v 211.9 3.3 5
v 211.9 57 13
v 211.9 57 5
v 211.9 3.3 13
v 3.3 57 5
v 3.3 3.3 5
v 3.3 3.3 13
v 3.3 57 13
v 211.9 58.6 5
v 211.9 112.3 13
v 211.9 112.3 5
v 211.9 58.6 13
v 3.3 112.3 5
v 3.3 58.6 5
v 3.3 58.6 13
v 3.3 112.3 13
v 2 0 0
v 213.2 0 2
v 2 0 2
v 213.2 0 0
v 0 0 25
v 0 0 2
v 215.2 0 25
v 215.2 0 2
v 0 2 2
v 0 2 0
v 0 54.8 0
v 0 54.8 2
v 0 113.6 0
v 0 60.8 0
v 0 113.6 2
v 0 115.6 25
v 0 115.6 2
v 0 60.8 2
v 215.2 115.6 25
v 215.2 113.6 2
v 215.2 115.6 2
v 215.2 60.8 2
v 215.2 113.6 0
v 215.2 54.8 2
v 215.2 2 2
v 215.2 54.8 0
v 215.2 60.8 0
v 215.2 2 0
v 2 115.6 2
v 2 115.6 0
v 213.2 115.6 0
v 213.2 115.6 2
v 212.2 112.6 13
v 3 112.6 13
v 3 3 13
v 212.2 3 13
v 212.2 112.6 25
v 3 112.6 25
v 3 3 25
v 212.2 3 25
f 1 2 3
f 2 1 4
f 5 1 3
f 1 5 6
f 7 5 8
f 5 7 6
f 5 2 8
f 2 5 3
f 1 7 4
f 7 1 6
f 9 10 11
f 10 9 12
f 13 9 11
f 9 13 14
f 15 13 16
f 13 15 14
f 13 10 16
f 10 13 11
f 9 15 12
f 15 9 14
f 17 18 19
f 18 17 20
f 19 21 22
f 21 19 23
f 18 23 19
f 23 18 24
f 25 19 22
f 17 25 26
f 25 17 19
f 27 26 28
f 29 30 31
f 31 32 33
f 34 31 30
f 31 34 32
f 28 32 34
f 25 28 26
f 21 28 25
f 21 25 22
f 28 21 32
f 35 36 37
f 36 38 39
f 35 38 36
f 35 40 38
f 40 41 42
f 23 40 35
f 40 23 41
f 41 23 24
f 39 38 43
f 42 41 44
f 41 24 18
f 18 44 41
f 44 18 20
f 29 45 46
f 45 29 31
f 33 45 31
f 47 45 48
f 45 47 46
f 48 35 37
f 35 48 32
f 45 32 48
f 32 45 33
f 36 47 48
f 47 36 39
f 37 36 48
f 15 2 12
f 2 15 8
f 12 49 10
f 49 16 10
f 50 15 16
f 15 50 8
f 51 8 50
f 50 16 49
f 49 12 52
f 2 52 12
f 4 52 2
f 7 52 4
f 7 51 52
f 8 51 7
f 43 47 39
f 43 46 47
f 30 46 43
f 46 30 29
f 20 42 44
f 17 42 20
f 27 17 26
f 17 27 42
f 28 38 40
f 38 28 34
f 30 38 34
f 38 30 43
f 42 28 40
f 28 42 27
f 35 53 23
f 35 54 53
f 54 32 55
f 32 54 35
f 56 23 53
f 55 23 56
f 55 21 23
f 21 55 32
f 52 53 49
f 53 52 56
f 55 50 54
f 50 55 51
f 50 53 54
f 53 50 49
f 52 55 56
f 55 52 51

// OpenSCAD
// WheresDat — Parametric small-parts tray, clear-box variant
//
// New filename (2026-09-22), not just new parameter values — sortimo_tray.scad's
// edits weren't showing up across STL exports/converters when tested under
// the original filename (identical output across three separate exports
// and two different SCAD-to-STL engines), pointing at a stale/cached
// source somewhere rather than a real geometry bug. This file exists so
// there's zero ambiguity: nothing could possibly have cached content
// under a name that didn't exist until now. Same design, same math,
// clean slate.
//
// Sized for real store-bought clear boxes (52mm at the base), NOT the
// Sortimo T-Boxx insert boxes sortimo_tray.scad still targets — X (length)
// keeps the real T-Boxx grid pitch since nothing else needs it changed,
// but Y (the channel/row axis) no longer matches T-Boxx spacing on
// purpose. If T-Boxx compatibility is ever needed again, that's still
// sortimo_tray.scad, unmodified from before this variant branched off.
//
// NOT verified / deliberately simplified: Bosch's actual snap/latch
// retention profile — irrelevant for this variant anyway, since it's not
// targeting Sortimo boxes.
//
// This file is written to be actually parametric: edit the values below
// (openscad-customizer compatible) rather than the geometry itself.

/* [Printer] */
// Actual build volume (300x300x330mm). Z isn't used by this flat-tray
// design — plenty of headroom regardless — kept here for reference.
max_bed_x = 300; // mm
max_bed_y = 300; // mm
max_bed_z = 330; // mm, unused by this design, informational only

/* [Grid — X still real T-Boxx pitch, Y no longer matches T-Boxx on purpose] */
module_size    = 52.3; // mm, one grid unit along X (real T-Boxx pitch — length axis only, see tray_extra_width for Y)
box_height     = 63;   // mm, reference only, not used for pocket depth

/* [Tray construction] */
pocket_depth         = 8;   // mm, recess depth — shallow on purpose, this is a cubby not a full socket
// 1mm divider, accepted only as PART of a combined fix together with
// tray_extra_width below — 1mm alone was tried and rejected as too thin.
// Divider is only 8mm tall (capped at pocket_depth, doesn't rise with
// outer_wall_height), which is the only reason 1mm is viable at all here.
wall_thickness       = 1;   // mm, internal divider wall between adjacent pockets
// Narrowed 5 -> 3mm (2026-09-22) for real channel clearance, not just to
// save material — outer_wall_thickness alone does NOT grow the channel
// under this file's pocket-inset formula (traced through explicitly:
// reducing it repositions a pocket closer to the tray edge without
// changing its width, since only one side of each row is truly
// outer-facing). The actual channel-width gain is routed through
// tray_extra_width below instead. NOTE: this changes tray_x too, since
// there's one outer_wall_thickness for both axes — tray_x is now 215.2mm
// (4*module_size + 2*3), not the old 219.2mm (that number came from a
// 5mm wall and wasn't preserved deliberately; flag if X specifically
// needs to hold at 219.2, which would need asymmetric wall thickness
// per axis, not implemented here).
outer_wall_thickness = 3;   // mm, perimeter wall
// The module_size grid pitch (52.3mm) is a verified real spec (T-Boxx)
// and isn't the thing to fudge for a same-shaped but different
// real-world box that just happens to not quite fit it. This instead
// grows the tray's own Y size directly, split evenly across the two
// stacked rows, independent of module_size — so length-axis
// compatibility (X, still real T-Boxx pitch) is untouched. Set so that,
// combined with outer_wall_thickness=3 above, tray_y lands at exactly
// 115.6mm (solved: 115.6 = 2*(module_size + tray_extra_width/2) + 2*3)
// — channel width comes out to 53.7mm against a 52mm box base, real
// margin (1.7mm) rather than the earlier razor-thin fits.
tray_extra_width     = 5;   // mm, total added to tray_y, split evenly across grid_rows
outer_wall_height    = 25;  // mm, total height of the raised perimeter rim, measured from the base
fit_clearance        = 0.3; // mm, small per-side tolerance so a box drops in without binding (NOT a structural wall)
tray_floor           = 5;   // mm, base plate thickness under the pockets

/* [Rigidity spine — bottom-side channel under each central divider] */
// Cross-section is a reasonable guess, NOT sourced from a specific spine
// material — verify against whatever stock you actually use.
spine_channel_enabled = true;
spine_channel_width   = 6;   // mm, channel width, centered on the divider
spine_channel_depth   = 2;   // mm, cut depth from the bottom face up into the floor

/* [Base chamfer — relieves corner curling on the print bed] */
chamfer_size   = 2; // mm, cut along each edge meeting at the corner
chamfer_height = 2; // mm, how far up from the base the cut runs

/* [Layout — one row per box: [col, row, width_units, height_units]] */
// One central divider running the full long axis (the wall between row 0
// and row 1), splitting the tray into two open channels. Each channel is
// one long pocket, 4 units end to end, with NO interior dividers. Full
// tiling of its own 4x2 bounding box (8 cells, all claimed) — if you edit
// this list yourself, watch for that: any grid cell inside the overall
// bounding box that no entry claims stays solid, uncut material.
boxes = [
    [0, 0, 4, 1],
    [0, 1, 4, 1],
];

// ---------------------------------------------------------------------
// Derived geometry — shouldn't need editing below this line
// ---------------------------------------------------------------------

grid_cols = max([for (b = boxes) b[0] + b[2]]);
grid_rows = max([for (b = boxes) b[1] + b[3]]);

// tray_extra_width split evenly across the row axis only — row_pitch is
// what a row-index actually advances by (module_size plus its share of
// the extra), kept separate from module_size itself since X/length still
// needs the real, unmodified T-Boxx pitch.
row_extra = tray_extra_width / grid_rows;
row_pitch = module_size + row_extra;

// Grid origin sits inset by outer_wall_thickness from the tray edge, so
// the perimeter is a full outer_wall_thickness regardless of grid size.
tray_x = grid_cols * module_size + outer_wall_thickness * 2;
tray_y = grid_rows * row_pitch + outer_wall_thickness * 2;
tray_z = tray_floor + pocket_depth;

assert(tray_x <= max_bed_x,
    str("Tray X (", tray_x, "mm) exceeds max_bed_x (", max_bed_x, "mm) — trim the layout or fix max_bed_x"));
assert(tray_y <= max_bed_y,
    str("Tray Y (", tray_y, "mm) exceeds max_bed_y (", max_bed_y, "mm) — trim the layout or fix max_bed_y"));
assert(!spine_channel_enabled || spine_channel_depth <= tray_floor - 1,
    str("spine_channel_depth (", spine_channel_depth, "mm) leaves less than 1mm of solid floor under a tray_floor of ", tray_floor, "mm — increase tray_floor or shrink spine_channel_depth"));

module base_chamfer_cut(width, depth, size, height) {
    corners = [[0, 0], [width, 0], [0, depth], [width, depth]];
    for (c = corners) {
        dx = (c[0] == 0) ? 1 : -1;
        dy = (c[1] == 0) ? 1 : -1;
        translate([c[0], c[1], -0.5])
            linear_extrude(height = height + 0.5)
                polygon([[0, 0], [dx * size, 0], [0, dy * size]]);
    }
}

// A ring/frame matching the existing outer_wall_thickness footprint,
// rising from the tray's current top surface up to outer_wall_height —
// same wall thickness continued taller, not a separate offset feature,
// so it sits flush with the wall below it.
module outer_wall_riser() {
    if (outer_wall_height > tray_z) {
        translate([0, 0, tray_z])
            difference() {
                cube([tray_x, tray_y, outer_wall_height - tray_z]);
                translate([outer_wall_thickness, outer_wall_thickness, -0.5])
                    cube([
                        tray_x - 2 * outer_wall_thickness,
                        tray_y - 2 * outer_wall_thickness,
                        outer_wall_height - tray_z + 1
                    ]);
            }
    }
}

module sortimo_tray_clearbox() {
    union() {
    difference() {
        // Solid base slab
        cube([tray_x, tray_y, tray_z]);

        // One recessed pocket per box in the layout. A side gets the full
        // div_inset (wall_thickness/2 + fit_clearance) only where it
        // borders ANOTHER pocket — that's what actually leaves a full
        // wall_thickness of solid divider material between two adjacent
        // boxes. A side sitting at the grid's own outer edge (0 or
        // grid_cols/rows*module_size, or grid_rows*row_pitch for Y) borders
        // the solid outer wall directly instead, which needs no structural
        // margin of its own — fit_clearance alone is enough there.
        for (b = boxes) {
            div_inset = wall_thickness / 2 + fit_clearance;
            // X stays on module_size (real T-Boxx pitch, untouched). Y
            // uses row_pitch so each row carries its share of
            // tray_extra_width.
            x0 = b[0] * module_size;
            y0 = b[1] * row_pitch;
            x1 = (b[0] + b[2]) * module_size;
            y1 = (b[1] + b[3]) * row_pitch;

            inset_west  = (x0 <= 0) ? fit_clearance : div_inset;
            inset_east  = (x1 >= grid_cols * module_size) ? fit_clearance : div_inset;
            inset_south = (y0 <= 0) ? fit_clearance : div_inset;
            inset_north = (y1 >= grid_rows * row_pitch) ? fit_clearance : div_inset;

            translate([
                outer_wall_thickness + x0 + inset_west,
                outer_wall_thickness + y0 + inset_south,
                tray_floor
            ])
            cube([
                (x1 - x0) - inset_west - inset_east,
                (y1 - y0) - inset_south - inset_north,
                pocket_depth + 1 // +1 so the cut clears the top face cleanly
            ]);
        }

        // Rigidity spine channel(s) — one per interior row boundary,
        // cut from the bottom face up into the floor only. Kept
        // shallower than tray_floor (asserted above) so it never
        // breaches a pocket above it.
        if (spine_channel_enabled) {
            for (r = [1 : grid_rows - 1]) {
                translate([
                    0,
                    outer_wall_thickness + r * row_pitch - spine_channel_width / 2,
                    -0.5
                ])
                cube([
                    tray_x,
                    spine_channel_width,
                    spine_channel_depth + 0.5 // +0.5 so the cut clears the bottom face cleanly
                ]);
            }
        }

        base_chamfer_cut(tray_x, tray_y, chamfer_size, chamfer_height);
    }
    outer_wall_riser();
    }
}

sortimo_tray_clearbox();
